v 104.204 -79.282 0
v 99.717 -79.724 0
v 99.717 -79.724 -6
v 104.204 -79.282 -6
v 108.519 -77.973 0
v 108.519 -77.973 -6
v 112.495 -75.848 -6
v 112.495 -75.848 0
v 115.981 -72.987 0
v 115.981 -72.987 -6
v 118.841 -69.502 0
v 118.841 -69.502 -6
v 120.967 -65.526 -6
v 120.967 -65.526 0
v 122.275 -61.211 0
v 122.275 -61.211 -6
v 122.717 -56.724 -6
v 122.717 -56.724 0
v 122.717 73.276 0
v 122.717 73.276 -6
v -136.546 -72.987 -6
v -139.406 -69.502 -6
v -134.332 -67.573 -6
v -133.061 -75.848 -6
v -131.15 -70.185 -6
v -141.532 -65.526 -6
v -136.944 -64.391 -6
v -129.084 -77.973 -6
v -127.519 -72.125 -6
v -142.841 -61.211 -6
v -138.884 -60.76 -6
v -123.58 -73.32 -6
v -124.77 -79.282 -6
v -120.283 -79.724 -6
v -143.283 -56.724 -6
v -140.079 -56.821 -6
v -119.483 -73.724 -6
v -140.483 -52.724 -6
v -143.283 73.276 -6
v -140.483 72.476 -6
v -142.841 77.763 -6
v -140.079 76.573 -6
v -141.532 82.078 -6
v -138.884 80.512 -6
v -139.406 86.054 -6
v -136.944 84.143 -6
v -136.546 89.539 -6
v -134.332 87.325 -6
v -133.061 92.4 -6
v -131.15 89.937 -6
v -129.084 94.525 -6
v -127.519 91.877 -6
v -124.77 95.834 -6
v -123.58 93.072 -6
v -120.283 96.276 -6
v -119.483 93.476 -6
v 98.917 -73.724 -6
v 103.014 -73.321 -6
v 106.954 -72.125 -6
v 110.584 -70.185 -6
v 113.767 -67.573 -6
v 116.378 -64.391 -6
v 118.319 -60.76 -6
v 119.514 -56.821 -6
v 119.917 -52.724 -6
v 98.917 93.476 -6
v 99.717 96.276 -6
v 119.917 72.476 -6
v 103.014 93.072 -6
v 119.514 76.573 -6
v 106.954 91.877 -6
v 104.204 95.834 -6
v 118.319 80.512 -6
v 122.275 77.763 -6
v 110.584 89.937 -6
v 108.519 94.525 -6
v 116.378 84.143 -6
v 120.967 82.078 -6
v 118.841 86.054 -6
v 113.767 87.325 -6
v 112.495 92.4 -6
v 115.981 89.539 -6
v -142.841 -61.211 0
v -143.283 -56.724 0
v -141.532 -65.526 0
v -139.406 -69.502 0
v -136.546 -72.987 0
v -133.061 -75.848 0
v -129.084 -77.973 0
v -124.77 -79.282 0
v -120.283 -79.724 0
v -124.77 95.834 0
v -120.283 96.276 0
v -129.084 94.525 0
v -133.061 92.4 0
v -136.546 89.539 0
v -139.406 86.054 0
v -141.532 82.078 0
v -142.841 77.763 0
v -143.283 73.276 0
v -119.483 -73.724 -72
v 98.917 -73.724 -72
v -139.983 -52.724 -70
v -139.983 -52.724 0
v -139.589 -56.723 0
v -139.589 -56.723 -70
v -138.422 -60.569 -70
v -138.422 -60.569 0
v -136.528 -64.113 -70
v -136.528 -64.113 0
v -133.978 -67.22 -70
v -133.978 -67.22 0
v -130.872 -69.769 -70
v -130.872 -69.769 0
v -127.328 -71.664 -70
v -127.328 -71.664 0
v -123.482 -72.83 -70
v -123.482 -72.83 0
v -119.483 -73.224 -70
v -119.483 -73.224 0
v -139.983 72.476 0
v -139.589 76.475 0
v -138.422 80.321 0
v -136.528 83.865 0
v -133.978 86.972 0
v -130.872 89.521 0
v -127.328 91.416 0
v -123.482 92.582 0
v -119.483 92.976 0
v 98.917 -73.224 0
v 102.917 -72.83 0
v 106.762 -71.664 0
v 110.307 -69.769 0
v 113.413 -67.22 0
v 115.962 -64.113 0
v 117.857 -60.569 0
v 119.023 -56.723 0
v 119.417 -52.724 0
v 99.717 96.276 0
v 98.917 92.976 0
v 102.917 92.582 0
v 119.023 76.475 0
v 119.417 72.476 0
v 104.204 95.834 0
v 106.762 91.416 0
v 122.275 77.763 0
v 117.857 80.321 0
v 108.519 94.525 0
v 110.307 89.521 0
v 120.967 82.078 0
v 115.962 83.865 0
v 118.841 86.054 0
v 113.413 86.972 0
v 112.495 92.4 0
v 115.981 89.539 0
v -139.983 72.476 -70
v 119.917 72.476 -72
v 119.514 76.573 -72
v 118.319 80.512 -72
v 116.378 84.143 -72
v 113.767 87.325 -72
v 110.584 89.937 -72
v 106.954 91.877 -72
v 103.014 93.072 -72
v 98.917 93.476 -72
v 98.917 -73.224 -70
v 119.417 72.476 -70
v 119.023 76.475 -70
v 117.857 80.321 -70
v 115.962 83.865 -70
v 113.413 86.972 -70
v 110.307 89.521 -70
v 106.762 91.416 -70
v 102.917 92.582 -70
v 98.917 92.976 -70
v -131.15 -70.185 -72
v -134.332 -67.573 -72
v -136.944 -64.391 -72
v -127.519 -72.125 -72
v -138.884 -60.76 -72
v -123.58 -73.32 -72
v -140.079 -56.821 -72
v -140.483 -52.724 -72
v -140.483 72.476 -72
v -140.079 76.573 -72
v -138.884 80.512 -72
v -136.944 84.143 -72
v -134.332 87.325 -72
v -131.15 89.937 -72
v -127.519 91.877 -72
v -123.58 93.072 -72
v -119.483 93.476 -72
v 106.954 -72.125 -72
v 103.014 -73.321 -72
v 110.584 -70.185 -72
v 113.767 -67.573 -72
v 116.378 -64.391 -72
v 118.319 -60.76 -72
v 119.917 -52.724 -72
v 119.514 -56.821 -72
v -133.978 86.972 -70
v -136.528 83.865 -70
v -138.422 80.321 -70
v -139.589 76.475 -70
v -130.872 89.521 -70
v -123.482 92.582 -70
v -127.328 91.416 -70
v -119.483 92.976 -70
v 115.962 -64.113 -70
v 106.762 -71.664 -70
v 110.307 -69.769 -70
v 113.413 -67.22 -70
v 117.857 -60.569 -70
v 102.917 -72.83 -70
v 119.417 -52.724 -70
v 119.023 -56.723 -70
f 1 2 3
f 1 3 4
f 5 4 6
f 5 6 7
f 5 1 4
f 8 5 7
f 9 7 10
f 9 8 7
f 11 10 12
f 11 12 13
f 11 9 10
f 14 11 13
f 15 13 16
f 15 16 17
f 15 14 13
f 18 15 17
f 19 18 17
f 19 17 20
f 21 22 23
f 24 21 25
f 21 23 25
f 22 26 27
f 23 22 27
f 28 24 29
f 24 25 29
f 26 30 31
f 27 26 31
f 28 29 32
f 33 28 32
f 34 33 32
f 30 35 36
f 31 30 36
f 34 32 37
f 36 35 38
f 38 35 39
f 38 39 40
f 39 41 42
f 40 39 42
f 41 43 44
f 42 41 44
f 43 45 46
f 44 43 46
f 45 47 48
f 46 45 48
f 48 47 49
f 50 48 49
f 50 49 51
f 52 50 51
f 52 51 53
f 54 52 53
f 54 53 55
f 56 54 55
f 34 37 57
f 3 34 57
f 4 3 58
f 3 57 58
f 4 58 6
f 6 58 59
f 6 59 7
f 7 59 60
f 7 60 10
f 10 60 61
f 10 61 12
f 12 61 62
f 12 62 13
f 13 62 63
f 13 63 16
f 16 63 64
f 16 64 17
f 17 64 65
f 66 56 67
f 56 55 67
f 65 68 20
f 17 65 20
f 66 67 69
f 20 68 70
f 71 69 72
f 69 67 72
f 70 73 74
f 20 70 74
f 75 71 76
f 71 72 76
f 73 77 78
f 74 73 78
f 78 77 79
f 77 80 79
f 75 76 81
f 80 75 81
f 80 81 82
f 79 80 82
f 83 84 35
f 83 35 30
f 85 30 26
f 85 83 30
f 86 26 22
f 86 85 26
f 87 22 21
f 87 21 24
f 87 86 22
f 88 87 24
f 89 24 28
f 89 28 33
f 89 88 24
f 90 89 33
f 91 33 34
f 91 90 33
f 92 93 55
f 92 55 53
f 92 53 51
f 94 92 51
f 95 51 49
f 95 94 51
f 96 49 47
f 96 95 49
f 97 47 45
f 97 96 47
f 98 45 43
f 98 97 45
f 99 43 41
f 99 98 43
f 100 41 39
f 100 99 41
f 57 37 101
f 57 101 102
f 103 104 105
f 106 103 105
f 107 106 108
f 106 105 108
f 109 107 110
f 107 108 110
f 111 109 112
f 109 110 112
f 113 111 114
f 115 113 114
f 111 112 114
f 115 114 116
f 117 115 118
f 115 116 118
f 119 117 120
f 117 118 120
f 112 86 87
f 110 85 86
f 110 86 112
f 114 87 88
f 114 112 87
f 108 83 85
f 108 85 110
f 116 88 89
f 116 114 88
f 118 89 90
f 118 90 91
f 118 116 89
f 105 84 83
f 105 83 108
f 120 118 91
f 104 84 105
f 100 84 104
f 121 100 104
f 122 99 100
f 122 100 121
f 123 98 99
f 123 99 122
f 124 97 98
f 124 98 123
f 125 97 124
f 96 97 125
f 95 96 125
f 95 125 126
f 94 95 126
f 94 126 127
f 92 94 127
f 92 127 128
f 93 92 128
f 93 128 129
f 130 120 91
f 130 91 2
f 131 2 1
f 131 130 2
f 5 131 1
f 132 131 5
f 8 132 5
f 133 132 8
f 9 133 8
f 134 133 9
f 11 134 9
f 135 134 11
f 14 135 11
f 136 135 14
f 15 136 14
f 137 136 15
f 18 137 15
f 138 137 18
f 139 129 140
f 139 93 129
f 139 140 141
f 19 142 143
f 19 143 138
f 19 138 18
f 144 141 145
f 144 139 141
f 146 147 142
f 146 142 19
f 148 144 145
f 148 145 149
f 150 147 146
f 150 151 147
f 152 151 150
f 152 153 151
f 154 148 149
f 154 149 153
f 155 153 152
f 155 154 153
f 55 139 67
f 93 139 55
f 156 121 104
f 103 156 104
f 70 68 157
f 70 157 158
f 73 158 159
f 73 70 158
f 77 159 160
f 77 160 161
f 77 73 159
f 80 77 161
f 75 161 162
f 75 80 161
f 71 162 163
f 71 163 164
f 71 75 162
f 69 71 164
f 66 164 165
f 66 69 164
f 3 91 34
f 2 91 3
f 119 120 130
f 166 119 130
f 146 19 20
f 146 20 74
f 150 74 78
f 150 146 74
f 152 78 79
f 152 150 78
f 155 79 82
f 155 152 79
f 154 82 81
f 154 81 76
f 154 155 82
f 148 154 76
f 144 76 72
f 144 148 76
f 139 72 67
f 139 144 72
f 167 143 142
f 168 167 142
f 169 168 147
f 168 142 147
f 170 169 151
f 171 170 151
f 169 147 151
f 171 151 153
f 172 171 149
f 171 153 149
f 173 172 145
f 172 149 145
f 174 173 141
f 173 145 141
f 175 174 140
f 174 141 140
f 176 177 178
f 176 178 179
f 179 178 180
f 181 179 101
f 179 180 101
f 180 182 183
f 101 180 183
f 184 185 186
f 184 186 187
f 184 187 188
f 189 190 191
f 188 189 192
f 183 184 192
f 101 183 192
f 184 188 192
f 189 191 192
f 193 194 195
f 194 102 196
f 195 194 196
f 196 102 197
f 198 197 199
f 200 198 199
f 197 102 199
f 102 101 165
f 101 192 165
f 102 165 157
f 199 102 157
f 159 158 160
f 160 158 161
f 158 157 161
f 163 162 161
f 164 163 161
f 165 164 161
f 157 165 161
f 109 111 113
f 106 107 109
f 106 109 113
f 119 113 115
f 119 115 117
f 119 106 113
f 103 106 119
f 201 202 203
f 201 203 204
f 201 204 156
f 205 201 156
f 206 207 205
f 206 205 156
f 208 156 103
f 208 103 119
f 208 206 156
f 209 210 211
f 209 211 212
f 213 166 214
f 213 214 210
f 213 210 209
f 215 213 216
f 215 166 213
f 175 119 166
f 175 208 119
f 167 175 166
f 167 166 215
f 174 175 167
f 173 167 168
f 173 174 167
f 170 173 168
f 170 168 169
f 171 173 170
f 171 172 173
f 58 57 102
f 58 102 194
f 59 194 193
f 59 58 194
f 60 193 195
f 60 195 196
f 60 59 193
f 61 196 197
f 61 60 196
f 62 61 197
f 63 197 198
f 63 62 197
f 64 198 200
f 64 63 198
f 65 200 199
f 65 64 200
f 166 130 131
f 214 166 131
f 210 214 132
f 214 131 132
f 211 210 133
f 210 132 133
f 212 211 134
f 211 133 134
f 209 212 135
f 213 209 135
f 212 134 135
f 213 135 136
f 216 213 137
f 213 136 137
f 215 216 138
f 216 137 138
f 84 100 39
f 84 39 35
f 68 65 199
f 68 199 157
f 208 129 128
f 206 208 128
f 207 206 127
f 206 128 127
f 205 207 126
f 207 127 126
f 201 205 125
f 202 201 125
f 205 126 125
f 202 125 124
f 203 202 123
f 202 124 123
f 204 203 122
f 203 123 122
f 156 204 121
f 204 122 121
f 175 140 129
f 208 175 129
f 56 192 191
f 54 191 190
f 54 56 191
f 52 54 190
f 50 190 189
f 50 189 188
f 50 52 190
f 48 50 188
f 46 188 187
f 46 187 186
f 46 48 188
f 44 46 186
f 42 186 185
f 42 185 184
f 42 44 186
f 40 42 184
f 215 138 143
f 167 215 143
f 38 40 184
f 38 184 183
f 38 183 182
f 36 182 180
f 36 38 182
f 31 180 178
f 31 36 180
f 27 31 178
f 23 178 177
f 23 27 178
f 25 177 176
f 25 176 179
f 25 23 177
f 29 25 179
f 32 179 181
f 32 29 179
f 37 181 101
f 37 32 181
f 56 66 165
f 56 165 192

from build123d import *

# Parameters (mm, degrees)
F1_DEPTH = 72
F2_DEPTH = 6
F4_DEPTH = 70


with BuildPart() as f1:
    # F0 (on Top) → F1 (new body)
    with BuildSketch(Plane.XY):
        with BuildLine():
            Line((98.917353, 93.475991), (-119.482647, 93.475991))
            ThreePointArc((-119.482647, 93.475991), (-134.331889, 87.325233), (-140.482647, 72.475991))
            Line((-140.482647, 72.475991), (-140.482647, -52.724009))
            ThreePointArc((-140.482647, -52.724009), (-134.331889, -67.573252), (-119.482647, -73.724009))
            Line((-119.482647, -73.724009), (98.917353, -73.724009))
            ThreePointArc((98.917353, -73.724009), (113.766596, -67.573252), (119.917353, -52.724009))
            Line((119.917353, -52.724009), (119.917353, 72.475991))
            ThreePointArc((119.917353, 72.475991), (113.766596, 87.325233), (98.917353, 93.475991))
        make_face()
    extrude(amount=-F1_DEPTH)

    # F0 (on Top) → F2 (join)
    with BuildSketch(Plane.XY):
        with BuildLine():
            Line((99.717353, 96.275991), (-120.282647, 96.275991))
            ThreePointArc((-120.282647, 96.275991), (-136.546103, 89.539446), (-143.282647, 73.275991))
            Line((-143.282647, 73.275991), (-143.282647, -56.724009))
            ThreePointArc((-143.282647, -56.724009), (-136.546103, -72.987465), (-120.282647, -79.724009))
            Line((-120.282647, -79.724009), (99.717353, -79.724009))
            ThreePointArc((99.717353, -79.724009), (115.980809, -72.987465), (122.717353, -56.724009))
            Line((122.717353, -56.724009), (122.717353, 73.275991))
            ThreePointArc((122.717353, 73.275991), (115.980809, 89.539446), (99.717353, 96.275991))
        make_face()
        with BuildLine():
            ThreePointArc((-140.482647, 72.475991), (-134.331889, 87.325233), (-119.482647, 93.475991))
            Line((-119.482647, 93.475991), (98.917353, 93.475991))
            ThreePointArc((98.917353, 93.475991), (113.766596, 87.325233), (119.917353, 72.475991))
            Line((119.917353, 72.475991), (119.917353, -52.724009))
            ThreePointArc((119.917353, -52.724009), (113.766596, -67.573252), (98.917353, -73.724009))
            Line((98.917353, -73.724009), (-119.482647, -73.724009))
            ThreePointArc((-119.482647, -73.724009), (-134.331889, -67.573252), (-140.482647, -52.724009))
            Line((-140.482647, -52.724009), (-140.482647, 72.475991))
        make_face(mode=Mode.SUBTRACT)
    extrude(amount=-F2_DEPTH)

    # F3 (on face) → F4 (cut)
    with BuildSketch(Plane.XY):
        with BuildLine():
            Line((98.917353, 92.975991), (-119.482647, 92.975991))
            ThreePointArc((-119.482647, 92.975991), (-133.978336, 86.97168), (-139.982647, 72.475991))
            Line((-139.982647, 72.475991), (-139.982647, -52.724009))
            ThreePointArc((-139.982647, -52.724009), (-133.978336, -67.219699), (-119.482647, -73.224009))
            Line((-119.482647, -73.224009), (98.917353, -73.224009))
            ThreePointArc((98.917353, -73.224009), (113.413042, -67.219699), (119.417353, -52.724009))
            Line((119.417353, -52.724009), (119.417353, 72.475991))
            ThreePointArc((119.417353, 72.475991), (113.413042, 86.97168), (98.917353, 92.975991))
        make_face()
    extrude(amount=-F4_DEPTH, mode=Mode.SUBTRACT)


solid = f1.part
